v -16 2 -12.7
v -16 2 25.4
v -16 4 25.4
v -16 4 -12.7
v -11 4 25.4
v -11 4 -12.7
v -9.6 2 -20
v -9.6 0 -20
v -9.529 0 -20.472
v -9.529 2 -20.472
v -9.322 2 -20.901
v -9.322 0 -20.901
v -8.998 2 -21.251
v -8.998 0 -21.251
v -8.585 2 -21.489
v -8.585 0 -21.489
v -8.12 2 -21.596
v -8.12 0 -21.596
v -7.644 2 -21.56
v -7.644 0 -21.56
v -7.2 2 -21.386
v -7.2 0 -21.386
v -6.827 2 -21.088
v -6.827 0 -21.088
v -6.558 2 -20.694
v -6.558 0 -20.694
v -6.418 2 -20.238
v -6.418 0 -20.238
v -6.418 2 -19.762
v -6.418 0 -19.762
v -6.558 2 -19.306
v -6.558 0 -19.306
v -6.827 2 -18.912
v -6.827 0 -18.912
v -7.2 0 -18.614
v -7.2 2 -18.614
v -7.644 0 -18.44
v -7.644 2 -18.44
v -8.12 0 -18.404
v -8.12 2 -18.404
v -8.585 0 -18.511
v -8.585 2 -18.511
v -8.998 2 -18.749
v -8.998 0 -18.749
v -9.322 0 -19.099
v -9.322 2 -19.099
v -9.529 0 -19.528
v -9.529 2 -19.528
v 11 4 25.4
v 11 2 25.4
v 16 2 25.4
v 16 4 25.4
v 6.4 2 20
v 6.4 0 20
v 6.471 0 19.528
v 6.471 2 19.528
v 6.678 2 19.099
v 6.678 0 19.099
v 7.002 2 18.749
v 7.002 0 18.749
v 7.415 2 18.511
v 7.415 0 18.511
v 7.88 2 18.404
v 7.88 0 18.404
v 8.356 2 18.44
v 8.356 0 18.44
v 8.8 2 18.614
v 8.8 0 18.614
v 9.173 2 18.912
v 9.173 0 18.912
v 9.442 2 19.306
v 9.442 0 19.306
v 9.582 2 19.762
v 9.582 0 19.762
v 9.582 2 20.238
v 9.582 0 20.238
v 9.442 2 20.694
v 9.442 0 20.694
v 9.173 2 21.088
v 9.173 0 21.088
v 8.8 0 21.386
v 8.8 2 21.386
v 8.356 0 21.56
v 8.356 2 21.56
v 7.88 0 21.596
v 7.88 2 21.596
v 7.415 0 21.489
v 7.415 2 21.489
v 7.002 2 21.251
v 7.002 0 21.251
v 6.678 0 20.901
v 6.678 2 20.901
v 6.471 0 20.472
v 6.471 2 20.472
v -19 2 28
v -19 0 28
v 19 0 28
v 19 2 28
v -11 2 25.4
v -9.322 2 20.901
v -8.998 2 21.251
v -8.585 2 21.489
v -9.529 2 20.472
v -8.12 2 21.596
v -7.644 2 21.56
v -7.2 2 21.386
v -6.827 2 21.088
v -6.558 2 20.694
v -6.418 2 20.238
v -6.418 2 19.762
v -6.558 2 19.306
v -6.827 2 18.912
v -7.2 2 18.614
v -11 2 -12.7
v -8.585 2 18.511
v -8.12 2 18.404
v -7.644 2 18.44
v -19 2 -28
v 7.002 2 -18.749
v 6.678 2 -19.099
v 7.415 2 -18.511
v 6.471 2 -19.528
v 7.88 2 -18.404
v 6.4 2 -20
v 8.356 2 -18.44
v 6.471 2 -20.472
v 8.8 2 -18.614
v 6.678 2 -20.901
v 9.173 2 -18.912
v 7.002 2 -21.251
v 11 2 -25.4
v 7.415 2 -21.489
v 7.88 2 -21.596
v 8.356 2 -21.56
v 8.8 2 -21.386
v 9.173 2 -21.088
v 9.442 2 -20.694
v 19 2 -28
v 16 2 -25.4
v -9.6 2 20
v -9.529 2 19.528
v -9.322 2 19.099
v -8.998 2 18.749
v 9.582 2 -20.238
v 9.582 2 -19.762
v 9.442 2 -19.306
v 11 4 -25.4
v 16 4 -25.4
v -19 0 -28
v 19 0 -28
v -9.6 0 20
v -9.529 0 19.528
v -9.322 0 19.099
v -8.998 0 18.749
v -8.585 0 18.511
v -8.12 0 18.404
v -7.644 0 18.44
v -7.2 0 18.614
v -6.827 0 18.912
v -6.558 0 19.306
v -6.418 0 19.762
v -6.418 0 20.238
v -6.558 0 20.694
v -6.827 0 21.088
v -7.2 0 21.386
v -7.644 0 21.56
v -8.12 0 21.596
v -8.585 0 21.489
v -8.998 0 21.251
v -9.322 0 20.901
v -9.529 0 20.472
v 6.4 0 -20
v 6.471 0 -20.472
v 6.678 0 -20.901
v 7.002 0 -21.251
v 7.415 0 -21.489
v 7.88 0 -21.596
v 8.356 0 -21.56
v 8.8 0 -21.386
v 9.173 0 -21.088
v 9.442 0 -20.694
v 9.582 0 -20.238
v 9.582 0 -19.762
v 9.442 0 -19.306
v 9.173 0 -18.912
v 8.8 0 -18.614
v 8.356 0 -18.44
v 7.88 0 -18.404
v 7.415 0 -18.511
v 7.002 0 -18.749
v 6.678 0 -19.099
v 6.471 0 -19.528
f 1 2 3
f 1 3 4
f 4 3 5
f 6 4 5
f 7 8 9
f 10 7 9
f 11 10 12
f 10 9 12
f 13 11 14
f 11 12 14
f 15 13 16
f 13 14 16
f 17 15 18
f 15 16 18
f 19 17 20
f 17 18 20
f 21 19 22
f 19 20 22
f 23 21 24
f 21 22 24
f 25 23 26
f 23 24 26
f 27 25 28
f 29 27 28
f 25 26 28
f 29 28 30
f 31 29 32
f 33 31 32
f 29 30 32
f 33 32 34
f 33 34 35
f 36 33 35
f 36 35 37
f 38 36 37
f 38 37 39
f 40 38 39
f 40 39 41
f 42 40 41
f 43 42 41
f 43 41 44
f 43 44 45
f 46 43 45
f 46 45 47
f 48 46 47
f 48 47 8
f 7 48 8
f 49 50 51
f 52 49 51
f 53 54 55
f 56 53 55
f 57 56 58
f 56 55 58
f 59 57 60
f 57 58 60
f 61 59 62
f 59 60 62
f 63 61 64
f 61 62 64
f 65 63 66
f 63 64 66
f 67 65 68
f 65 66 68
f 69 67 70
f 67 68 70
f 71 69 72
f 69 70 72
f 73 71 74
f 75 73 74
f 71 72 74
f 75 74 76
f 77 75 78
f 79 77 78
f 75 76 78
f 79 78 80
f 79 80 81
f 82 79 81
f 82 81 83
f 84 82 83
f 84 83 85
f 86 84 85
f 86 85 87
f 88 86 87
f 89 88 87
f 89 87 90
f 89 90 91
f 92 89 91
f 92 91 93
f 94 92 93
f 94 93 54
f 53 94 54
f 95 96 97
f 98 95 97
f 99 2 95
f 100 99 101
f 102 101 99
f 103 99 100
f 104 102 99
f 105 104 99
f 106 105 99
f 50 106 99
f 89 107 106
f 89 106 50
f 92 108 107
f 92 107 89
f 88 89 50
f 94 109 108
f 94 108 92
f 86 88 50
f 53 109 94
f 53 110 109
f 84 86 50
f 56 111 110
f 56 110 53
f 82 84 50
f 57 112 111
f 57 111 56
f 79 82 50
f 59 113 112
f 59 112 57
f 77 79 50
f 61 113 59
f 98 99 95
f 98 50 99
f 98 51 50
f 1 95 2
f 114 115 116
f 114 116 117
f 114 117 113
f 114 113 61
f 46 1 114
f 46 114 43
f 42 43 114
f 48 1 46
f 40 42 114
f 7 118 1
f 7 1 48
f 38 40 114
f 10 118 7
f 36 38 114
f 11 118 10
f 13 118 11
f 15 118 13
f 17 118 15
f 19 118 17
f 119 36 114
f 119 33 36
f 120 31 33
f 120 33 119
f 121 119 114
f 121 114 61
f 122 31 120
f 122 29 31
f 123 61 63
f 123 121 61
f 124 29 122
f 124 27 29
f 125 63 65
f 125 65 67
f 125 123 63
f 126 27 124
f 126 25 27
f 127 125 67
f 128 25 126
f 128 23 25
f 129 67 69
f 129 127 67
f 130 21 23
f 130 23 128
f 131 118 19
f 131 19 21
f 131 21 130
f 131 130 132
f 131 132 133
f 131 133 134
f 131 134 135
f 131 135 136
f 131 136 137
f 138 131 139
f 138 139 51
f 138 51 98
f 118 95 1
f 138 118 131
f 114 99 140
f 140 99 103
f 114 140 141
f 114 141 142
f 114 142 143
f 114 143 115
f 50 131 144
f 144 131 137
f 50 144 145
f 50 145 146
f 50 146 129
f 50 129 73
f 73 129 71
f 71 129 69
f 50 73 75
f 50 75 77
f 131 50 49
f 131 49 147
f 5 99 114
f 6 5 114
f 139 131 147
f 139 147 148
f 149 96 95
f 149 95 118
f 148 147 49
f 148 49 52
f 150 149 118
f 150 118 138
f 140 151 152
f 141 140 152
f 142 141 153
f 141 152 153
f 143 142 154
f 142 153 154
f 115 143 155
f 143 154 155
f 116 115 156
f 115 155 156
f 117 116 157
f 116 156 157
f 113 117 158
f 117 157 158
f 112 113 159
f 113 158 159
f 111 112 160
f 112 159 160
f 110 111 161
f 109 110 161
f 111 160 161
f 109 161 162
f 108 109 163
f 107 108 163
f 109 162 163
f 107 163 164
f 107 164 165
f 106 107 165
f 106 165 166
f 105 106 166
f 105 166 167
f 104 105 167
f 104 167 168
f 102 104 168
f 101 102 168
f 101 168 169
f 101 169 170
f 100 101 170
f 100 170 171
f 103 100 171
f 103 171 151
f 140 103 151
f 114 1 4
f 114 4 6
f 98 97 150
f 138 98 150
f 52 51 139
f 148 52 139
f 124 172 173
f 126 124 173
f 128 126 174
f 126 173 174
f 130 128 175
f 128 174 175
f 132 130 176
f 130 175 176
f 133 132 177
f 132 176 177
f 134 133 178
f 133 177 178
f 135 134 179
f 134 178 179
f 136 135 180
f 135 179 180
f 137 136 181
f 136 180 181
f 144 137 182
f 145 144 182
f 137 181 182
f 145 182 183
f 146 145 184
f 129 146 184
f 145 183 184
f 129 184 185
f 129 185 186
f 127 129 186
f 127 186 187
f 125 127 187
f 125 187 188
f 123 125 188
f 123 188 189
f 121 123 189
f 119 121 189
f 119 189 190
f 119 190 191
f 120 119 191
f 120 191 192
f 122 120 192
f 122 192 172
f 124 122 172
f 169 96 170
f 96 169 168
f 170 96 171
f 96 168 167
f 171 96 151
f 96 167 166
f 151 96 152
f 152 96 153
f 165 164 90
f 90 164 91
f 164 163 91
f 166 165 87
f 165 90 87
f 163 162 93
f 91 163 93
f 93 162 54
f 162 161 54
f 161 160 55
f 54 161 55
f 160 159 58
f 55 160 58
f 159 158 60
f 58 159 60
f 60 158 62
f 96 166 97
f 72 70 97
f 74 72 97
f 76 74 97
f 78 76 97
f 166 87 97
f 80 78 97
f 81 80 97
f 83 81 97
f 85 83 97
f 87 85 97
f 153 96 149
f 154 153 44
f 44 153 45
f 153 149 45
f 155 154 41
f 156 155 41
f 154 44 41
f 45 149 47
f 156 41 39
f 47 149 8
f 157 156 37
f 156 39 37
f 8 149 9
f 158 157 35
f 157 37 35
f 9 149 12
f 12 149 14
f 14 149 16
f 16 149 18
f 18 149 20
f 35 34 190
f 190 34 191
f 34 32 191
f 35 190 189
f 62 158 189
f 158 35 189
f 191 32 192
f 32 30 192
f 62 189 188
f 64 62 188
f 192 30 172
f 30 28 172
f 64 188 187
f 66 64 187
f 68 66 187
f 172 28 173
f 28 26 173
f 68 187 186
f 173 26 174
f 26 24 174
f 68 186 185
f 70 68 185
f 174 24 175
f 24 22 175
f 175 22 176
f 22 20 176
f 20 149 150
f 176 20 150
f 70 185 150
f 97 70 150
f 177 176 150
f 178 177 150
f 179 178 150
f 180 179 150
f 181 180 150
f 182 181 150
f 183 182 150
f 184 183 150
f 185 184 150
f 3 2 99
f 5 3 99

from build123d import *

# Parameters (mm, degrees)
SKETCH1_W                  = 38
SKETCH1_H                  = 56
BOSS_EXTRUDE1_DEPTH        = 2
SKETCH2_W                  = 5
SKETCH2_H                  = 38.1
SKETCH2_H_2                = 50.8
BOSS_EXTRUDE2_DEPTH        = 2
F_3_2_3_2_DIAMETER_HOLE1_D = 3.2


with BuildPart() as part:
    # Sketch1 → Boss-Extrude1 (new body)
    with BuildSketch(Plane(origin=(0, 0, 0), x_dir=(1, 0, 0), z_dir=(0, 1, 0))):
        Rectangle(SKETCH1_W, SKETCH1_H)
    extrude(amount=BOSS_EXTRUDE1_DEPTH)

    # Sketch2 → Boss-Extrude2 (add)
    with BuildSketch(Plane(origin=(0, 2, 0), x_dir=(1, 0, 0), z_dir=(0, 1, 0))):
        with Locations((-13.5, -6.35)):
            Rectangle(SKETCH2_W, SKETCH2_H)
        with Locations((13.5, 0)):
            Rectangle(SKETCH2_W, SKETCH2_H_2)
    extrude(amount=BOSS_EXTRUDE2_DEPTH)

    # Ø3.2 (3.2) Diameter Hole1 (through all)
    with Locations(Plane(origin=(0, 2, 0), x_dir=(1, 0, 0), z_dir=(0, 1, 0))):
        with Locations((-8, -20), (8, -20), (-8, 20), (8, 20)):
            Hole(F_3_2_3_2_DIAMETER_HOLE1_D / 2)


solid = part.part
